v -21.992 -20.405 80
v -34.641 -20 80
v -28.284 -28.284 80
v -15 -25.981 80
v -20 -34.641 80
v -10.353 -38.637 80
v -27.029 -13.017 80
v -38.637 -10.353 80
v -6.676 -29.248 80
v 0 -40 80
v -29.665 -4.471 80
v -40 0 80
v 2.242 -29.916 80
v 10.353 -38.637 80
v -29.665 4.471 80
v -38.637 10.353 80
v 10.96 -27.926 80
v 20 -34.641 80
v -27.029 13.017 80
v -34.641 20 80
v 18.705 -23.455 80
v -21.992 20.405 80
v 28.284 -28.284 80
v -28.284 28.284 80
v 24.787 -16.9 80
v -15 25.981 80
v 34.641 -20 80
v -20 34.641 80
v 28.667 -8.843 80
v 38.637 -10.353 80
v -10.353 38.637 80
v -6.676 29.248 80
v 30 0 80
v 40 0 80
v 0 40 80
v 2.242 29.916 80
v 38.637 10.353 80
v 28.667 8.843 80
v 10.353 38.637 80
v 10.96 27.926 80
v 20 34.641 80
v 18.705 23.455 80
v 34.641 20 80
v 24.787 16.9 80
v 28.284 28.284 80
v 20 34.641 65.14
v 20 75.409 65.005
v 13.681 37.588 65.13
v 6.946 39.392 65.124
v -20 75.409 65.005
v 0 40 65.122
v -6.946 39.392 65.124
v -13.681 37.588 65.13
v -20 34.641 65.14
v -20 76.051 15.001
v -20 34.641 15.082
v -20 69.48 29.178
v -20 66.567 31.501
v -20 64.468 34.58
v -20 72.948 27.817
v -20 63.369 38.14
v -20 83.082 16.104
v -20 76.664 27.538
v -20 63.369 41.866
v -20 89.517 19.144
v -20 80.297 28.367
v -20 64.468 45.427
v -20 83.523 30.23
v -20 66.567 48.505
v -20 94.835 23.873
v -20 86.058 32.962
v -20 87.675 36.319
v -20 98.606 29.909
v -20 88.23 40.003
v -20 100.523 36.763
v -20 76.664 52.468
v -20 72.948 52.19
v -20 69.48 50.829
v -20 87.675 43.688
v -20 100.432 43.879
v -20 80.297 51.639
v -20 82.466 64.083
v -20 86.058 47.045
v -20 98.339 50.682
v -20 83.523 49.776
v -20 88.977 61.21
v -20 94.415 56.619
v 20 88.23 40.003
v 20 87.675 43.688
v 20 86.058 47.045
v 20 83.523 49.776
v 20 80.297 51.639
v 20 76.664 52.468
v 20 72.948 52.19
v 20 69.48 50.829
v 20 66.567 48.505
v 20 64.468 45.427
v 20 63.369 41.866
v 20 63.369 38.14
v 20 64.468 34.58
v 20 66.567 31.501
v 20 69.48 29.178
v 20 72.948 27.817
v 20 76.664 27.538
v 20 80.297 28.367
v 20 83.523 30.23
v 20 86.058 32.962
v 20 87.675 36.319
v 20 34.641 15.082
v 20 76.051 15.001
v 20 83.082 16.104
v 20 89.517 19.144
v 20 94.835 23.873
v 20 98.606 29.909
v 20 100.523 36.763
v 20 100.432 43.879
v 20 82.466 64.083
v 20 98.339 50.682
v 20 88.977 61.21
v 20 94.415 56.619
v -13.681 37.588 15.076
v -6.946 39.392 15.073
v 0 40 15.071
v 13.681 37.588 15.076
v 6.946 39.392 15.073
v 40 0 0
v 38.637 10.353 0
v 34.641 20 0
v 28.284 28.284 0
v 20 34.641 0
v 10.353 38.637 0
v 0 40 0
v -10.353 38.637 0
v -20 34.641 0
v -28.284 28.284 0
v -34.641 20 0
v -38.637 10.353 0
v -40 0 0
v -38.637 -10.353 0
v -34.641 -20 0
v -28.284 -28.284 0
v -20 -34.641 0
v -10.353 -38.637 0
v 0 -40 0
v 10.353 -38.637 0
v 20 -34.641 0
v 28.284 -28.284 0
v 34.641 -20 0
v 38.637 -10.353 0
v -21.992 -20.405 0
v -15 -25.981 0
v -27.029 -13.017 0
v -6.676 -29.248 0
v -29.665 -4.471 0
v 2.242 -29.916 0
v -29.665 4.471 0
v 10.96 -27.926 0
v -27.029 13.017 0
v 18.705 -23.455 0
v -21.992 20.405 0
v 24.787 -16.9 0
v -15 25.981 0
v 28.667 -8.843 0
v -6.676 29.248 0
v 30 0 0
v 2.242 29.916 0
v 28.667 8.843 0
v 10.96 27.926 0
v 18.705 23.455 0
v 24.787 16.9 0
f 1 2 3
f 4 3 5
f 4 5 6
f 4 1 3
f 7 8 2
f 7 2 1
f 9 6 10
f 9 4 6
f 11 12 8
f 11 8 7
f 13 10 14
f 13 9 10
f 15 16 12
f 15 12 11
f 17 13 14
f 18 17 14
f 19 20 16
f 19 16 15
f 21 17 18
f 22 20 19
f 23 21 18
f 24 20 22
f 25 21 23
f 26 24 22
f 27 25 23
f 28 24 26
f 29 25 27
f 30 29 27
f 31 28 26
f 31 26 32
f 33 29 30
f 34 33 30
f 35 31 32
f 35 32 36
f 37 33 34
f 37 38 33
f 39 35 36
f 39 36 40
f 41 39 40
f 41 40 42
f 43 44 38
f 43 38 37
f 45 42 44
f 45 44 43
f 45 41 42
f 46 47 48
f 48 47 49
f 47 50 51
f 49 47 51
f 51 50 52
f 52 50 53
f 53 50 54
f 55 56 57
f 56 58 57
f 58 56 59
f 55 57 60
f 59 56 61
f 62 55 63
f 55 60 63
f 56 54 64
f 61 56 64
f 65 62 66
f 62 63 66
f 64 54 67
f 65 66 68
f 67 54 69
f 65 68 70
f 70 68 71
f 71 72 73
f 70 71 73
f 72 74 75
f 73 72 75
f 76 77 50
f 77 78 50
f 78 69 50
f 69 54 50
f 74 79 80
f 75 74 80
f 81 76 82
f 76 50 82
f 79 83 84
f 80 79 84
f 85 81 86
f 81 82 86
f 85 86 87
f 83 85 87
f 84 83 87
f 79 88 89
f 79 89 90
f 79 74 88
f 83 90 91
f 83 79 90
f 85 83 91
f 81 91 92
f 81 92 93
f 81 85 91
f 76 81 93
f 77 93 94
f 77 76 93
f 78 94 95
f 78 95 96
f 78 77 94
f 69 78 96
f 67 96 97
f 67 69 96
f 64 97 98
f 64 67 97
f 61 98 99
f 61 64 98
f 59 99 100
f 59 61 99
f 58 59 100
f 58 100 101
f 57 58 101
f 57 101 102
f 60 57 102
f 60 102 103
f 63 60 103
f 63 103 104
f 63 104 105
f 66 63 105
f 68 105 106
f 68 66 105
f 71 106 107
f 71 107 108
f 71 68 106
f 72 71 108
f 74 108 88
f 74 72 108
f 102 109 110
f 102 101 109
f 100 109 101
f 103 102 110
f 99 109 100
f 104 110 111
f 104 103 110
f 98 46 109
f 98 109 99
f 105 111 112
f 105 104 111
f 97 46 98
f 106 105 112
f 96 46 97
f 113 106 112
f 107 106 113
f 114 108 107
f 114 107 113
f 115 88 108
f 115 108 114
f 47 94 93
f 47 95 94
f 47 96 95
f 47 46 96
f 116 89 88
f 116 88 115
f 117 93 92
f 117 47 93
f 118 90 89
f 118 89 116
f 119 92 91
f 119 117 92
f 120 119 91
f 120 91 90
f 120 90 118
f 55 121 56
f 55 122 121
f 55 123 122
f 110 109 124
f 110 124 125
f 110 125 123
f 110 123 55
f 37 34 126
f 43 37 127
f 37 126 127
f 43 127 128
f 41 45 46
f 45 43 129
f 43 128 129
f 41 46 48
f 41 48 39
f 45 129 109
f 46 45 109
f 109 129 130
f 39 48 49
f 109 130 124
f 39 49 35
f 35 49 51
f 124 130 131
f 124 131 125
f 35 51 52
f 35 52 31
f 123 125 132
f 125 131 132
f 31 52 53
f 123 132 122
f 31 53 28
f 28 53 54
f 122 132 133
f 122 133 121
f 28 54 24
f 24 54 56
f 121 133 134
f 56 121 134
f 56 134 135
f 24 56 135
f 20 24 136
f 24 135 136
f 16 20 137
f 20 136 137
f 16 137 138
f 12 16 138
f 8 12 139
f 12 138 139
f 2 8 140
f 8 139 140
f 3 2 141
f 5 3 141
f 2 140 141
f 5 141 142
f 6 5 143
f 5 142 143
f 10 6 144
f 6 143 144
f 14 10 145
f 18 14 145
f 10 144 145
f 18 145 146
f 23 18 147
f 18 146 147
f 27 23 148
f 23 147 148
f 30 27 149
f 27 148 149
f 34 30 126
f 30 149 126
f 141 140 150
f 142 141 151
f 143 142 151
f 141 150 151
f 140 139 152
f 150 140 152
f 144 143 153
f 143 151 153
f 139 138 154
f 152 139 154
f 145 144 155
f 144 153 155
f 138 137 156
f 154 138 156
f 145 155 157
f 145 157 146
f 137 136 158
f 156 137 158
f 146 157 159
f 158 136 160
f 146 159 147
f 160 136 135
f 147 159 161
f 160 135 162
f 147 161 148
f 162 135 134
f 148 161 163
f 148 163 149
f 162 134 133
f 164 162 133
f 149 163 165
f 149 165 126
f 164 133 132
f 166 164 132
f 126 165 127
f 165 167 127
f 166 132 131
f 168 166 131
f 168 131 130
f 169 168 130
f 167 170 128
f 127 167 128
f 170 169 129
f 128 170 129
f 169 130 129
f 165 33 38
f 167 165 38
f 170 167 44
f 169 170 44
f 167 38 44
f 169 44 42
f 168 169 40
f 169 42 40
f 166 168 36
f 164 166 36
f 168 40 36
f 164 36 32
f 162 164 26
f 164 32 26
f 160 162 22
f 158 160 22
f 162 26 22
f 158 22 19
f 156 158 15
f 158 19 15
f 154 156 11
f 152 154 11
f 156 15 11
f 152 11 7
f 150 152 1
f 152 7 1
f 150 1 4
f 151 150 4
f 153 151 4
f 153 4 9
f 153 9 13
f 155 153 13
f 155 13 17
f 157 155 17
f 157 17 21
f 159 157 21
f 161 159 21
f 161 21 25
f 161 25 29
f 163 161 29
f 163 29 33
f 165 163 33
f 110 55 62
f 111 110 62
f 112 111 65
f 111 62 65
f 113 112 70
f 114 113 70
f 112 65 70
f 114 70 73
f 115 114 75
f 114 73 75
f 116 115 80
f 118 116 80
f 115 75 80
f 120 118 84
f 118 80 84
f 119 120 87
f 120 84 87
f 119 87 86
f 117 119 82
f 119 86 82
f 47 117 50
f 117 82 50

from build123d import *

# Parameters (mm, degrees)
F0_R          = 40
F1_DEPTH      = 80
F2_R          = 12.5
F3_DEPTH      = 20
F3_DEPTH_BACK = 20
F4_R          = 30
F5_DEPTH      = 146


with BuildPart() as f1:
    # F0 (on Top) → F1 (new body)
    with BuildSketch(Plane.XY):
        Circle(F0_R)
    extrude(amount=F1_DEPTH)

    # F2 (on Right) → F3 (join, two sides)
    with BuildSketch(Plane.YZ) as f3_sk:
        with BuildLine():
            Line((14.4573056011, 65.2065587372), (14.4573056011, 15.1210717529))
            Line((14.4573056011, 15.1210717529), (76.0508775141, 15.0012425378))
            ThreePointArc((76.0508775141, 15.0012425378), (100.7319009994, 40.3243347071), (75.40880883, 65.0053581924))
            Line((75.40880883, 65.0053581924), (14.4573056011, 65.2065587372))
        make_face()
        with Locations((75.7298431721, 40.0033003651)):
            Circle(F2_R, mode=Mode.SUBTRACT)
    extrude(amount=-F3_DEPTH)
    extrude(f3_sk.sketch, amount=F3_DEPTH_BACK)

    # F4 (on face) → F5 (cut)
    with BuildSketch(Plane.XY.offset(80)):
        Circle(F4_R)
    extrude(amount=-F5_DEPTH, mode=Mode.SUBTRACT)


solid = f1.part
